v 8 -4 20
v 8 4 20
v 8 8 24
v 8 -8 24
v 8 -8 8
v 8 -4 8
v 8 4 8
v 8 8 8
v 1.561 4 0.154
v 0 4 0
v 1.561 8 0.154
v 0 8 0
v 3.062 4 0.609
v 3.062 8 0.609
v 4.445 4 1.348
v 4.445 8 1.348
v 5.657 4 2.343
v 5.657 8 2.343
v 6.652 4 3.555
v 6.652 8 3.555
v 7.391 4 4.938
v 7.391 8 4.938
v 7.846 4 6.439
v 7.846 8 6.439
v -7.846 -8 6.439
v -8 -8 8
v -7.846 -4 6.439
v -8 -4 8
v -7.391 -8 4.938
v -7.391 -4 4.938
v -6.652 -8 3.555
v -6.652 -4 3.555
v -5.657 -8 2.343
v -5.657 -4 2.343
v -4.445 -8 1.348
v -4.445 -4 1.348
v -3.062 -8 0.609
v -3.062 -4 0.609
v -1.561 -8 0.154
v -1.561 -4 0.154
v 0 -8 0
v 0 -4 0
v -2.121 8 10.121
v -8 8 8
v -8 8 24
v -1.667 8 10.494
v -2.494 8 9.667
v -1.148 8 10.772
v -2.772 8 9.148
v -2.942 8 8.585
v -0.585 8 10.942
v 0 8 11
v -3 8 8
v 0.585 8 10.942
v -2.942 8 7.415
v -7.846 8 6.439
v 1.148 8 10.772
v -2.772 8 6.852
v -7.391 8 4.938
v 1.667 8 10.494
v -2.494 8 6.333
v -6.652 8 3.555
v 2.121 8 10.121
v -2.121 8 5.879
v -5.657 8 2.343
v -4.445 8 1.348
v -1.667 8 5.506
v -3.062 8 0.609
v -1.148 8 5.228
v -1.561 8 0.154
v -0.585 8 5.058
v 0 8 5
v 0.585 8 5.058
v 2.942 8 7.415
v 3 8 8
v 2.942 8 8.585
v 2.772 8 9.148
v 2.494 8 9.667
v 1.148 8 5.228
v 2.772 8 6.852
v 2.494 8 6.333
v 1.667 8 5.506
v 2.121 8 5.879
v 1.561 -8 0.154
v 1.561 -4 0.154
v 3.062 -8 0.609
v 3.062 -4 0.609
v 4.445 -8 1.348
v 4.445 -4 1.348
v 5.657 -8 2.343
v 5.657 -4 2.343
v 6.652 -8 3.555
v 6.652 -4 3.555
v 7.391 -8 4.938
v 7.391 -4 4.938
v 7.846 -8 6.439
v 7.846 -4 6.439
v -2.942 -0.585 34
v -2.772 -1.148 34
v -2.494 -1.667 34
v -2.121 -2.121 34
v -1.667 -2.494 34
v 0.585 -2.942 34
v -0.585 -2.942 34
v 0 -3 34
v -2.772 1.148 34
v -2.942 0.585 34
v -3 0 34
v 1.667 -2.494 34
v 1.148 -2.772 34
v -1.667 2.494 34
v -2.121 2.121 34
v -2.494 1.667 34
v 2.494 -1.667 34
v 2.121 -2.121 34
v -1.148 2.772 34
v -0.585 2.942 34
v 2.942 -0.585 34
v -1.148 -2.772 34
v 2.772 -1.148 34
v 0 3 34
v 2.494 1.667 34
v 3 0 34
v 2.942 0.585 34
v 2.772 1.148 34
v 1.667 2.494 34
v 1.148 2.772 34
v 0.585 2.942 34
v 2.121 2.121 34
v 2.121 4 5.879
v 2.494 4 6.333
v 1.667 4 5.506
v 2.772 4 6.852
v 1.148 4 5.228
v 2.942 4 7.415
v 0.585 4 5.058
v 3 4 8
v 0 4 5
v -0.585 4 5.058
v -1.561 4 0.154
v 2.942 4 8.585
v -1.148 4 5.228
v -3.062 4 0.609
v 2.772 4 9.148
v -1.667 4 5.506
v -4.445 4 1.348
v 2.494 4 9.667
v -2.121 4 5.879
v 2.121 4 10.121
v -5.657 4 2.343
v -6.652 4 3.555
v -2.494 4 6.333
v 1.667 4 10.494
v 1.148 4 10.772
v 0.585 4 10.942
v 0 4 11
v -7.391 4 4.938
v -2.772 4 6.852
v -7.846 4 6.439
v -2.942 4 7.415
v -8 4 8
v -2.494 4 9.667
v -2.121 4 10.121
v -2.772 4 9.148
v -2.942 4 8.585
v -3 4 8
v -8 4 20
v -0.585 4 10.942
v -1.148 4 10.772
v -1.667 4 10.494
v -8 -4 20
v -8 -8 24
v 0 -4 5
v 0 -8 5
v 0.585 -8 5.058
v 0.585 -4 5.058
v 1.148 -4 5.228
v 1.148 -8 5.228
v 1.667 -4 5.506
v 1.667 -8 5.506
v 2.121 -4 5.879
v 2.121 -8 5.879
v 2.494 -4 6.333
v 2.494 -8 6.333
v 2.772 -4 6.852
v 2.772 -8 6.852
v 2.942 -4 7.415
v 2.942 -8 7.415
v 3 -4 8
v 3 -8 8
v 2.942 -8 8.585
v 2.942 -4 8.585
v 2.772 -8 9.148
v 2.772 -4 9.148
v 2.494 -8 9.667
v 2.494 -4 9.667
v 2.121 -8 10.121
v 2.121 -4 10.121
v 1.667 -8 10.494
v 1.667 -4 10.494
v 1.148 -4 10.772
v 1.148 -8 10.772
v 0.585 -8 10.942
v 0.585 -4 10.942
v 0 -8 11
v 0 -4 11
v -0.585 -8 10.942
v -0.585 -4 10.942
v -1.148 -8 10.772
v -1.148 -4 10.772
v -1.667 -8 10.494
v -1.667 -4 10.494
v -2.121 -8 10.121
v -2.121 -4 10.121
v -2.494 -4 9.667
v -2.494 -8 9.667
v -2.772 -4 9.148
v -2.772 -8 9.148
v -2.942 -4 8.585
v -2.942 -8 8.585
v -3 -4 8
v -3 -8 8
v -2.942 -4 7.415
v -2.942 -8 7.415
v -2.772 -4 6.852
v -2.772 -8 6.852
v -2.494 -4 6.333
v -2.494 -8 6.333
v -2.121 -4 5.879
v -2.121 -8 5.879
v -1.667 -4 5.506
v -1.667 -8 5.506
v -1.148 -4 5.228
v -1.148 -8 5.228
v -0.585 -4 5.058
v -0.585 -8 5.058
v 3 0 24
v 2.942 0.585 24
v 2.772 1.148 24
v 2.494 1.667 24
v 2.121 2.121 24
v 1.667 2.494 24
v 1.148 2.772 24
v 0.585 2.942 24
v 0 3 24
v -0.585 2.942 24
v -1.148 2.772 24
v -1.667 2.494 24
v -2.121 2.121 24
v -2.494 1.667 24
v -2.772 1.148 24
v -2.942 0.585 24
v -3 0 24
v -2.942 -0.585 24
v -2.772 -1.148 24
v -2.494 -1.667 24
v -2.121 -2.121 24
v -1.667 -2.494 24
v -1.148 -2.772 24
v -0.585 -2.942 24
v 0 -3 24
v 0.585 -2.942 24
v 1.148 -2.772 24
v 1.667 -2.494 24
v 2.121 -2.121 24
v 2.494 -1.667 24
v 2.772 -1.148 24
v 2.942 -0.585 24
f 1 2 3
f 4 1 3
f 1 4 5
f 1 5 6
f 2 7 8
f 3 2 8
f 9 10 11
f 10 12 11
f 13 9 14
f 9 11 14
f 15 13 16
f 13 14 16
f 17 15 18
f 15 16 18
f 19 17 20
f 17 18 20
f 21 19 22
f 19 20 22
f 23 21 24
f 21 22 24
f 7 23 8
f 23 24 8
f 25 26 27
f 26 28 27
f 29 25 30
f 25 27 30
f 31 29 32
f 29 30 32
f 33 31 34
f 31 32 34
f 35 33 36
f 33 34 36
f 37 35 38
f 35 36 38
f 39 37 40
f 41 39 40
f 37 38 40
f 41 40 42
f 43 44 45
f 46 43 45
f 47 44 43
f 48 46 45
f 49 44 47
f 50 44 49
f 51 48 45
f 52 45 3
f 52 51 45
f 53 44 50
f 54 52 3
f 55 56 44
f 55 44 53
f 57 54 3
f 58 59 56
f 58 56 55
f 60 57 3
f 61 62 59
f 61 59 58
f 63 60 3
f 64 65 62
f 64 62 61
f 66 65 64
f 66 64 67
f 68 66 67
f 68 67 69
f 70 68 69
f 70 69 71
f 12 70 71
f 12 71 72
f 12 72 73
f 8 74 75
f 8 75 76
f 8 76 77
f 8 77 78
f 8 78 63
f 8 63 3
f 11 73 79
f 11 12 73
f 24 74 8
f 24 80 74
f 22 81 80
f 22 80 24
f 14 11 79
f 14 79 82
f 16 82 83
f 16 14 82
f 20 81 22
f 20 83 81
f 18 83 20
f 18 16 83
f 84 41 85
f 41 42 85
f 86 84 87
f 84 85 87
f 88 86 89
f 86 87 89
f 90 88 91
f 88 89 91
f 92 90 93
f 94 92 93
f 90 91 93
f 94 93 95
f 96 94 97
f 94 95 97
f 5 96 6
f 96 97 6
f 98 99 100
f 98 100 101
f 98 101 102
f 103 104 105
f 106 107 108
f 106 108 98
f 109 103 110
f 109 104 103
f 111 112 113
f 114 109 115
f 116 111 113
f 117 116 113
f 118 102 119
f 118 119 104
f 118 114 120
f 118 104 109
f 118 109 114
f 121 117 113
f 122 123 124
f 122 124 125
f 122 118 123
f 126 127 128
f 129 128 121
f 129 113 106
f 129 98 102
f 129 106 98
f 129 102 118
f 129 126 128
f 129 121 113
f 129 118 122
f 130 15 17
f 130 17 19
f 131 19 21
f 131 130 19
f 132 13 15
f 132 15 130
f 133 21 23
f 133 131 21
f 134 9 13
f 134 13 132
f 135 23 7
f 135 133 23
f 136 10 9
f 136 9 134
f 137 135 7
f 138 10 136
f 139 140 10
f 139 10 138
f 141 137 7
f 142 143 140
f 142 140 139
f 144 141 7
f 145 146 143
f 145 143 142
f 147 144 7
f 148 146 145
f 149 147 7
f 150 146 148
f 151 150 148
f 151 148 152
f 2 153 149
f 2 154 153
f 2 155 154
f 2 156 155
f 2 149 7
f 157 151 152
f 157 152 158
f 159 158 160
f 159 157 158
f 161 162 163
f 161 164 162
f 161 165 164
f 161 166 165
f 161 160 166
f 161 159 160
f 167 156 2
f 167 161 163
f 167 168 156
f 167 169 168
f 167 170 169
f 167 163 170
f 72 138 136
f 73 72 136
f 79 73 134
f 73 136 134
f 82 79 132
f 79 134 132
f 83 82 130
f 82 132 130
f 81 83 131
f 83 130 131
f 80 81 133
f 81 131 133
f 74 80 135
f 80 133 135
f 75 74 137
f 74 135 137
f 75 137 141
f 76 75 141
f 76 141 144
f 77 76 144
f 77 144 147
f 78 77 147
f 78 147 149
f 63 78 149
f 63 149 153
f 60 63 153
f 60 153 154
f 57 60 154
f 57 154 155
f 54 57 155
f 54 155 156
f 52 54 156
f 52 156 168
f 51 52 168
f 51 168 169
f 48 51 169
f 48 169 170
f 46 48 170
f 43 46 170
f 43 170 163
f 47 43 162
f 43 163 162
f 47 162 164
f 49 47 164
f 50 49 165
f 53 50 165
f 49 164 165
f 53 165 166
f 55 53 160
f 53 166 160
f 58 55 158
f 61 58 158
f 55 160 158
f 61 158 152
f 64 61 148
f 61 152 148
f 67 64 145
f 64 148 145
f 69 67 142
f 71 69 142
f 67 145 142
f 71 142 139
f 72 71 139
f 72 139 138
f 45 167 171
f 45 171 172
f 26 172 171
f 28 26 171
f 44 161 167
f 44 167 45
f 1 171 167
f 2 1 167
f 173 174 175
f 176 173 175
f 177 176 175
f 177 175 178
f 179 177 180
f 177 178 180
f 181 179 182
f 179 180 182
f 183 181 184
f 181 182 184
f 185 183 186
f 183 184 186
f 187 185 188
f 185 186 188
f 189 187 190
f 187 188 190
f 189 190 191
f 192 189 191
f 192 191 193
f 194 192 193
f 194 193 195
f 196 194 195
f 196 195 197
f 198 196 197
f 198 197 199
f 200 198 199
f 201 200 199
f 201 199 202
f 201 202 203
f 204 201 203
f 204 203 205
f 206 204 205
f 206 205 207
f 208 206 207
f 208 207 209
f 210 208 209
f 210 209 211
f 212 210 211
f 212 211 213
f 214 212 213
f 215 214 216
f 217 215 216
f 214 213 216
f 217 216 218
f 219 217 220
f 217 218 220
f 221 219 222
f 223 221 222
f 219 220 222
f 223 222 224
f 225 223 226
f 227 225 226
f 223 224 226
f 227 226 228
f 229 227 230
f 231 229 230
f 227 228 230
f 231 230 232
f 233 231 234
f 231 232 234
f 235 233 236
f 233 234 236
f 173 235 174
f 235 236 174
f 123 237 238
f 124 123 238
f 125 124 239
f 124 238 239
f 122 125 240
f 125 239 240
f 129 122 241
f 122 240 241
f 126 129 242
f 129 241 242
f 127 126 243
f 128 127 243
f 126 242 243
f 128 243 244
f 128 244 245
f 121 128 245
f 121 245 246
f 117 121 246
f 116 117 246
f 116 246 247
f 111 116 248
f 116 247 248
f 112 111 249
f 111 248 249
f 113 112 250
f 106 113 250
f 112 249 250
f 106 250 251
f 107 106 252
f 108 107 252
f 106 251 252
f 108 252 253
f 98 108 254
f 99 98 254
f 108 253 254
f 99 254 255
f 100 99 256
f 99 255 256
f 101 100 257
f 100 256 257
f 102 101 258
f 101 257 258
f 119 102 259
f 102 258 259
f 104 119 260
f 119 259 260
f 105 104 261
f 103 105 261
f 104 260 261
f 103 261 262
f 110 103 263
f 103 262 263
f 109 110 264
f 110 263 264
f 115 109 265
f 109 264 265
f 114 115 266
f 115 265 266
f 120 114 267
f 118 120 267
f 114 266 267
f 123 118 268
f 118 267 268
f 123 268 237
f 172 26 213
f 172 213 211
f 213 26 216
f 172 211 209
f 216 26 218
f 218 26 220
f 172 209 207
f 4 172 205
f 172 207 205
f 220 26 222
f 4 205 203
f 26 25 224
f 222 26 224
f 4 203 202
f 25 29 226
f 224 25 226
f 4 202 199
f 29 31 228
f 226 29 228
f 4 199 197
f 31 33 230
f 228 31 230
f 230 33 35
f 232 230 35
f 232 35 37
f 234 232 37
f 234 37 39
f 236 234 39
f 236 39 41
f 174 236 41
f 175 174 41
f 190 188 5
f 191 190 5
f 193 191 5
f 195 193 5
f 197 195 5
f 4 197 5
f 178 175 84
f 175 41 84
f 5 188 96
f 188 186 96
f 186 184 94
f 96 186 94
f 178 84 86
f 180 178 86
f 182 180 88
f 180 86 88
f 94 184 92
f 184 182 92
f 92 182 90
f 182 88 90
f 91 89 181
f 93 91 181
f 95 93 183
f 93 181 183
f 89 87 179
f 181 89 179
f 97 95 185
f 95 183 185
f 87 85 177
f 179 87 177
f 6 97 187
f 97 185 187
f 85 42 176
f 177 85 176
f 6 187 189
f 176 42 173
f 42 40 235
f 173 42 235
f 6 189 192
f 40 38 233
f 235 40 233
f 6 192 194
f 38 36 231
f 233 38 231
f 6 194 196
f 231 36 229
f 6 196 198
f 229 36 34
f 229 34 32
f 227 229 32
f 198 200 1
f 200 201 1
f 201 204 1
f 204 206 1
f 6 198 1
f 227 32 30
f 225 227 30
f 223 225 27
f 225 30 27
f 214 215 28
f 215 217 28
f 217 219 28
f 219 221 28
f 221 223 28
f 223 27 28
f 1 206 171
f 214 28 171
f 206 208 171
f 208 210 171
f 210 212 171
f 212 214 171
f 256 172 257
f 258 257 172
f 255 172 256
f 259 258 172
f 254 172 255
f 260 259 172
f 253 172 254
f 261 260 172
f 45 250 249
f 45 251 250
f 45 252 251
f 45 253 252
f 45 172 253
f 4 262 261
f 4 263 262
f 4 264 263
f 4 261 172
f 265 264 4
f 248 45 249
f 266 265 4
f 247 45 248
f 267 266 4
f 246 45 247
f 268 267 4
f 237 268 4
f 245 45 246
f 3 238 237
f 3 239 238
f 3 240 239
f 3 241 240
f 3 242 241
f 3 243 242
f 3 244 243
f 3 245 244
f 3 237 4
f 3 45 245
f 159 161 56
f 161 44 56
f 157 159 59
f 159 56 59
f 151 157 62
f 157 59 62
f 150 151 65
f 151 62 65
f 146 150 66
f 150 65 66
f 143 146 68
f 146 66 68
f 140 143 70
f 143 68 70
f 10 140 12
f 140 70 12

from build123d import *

# Parameters (mm, degrees)
SKETCH1_W           = 16
SKETCH1_H           = 16
BOSS_EXTRUDE1_DEPTH = 24
SKETCH3_R           = 3
BOSS_EXTRUDE2_DEPTH = 10
SKETCH4_W           = 20
SKETCH4_H           = 8
CUT_EXTRUDE1_DEPTH  = 39.418745425
SKETCH5_R           = 3
CUT_EXTRUDE2_DEPTH  = 39.418745425
FILLET1_R           = 8


with BuildPart() as part:
    # Sketch1 → Boss-Extrude1 (new body)
    with BuildSketch(Plane.XY):
        Rectangle(SKETCH1_W, SKETCH1_H)
    extrude(amount=BOSS_EXTRUDE1_DEPTH)

    # Sketch3 → Boss-Extrude2 (add)
    with BuildSketch(Plane.XY.offset(24)):
        Circle(SKETCH3_R)
    extrude(amount=BOSS_EXTRUDE2_DEPTH)

    # Sketch4 → Cut-Extrude1 (cut, through all)
    with BuildSketch(Plane.ZY.offset(8)):
        with Locations((10, 0)):
            Rectangle(SKETCH4_W, SKETCH4_H)
    extrude(amount=-CUT_EXTRUDE1_DEPTH, mode=Mode.SUBTRACT)

    # Sketch5 → Cut-Extrude2 (cut, through all)
    with BuildSketch(Plane.XZ.offset(8)):
        with Locations(Location((0, 8, 0), (0, 0, 270))):
            Circle(SKETCH5_R)
    extrude(amount=-CUT_EXTRUDE2_DEPTH, mode=Mode.SUBTRACT)

    # Fillet1
    fillet1_edges = [part.edges().sort_by_distance(p)[0] for p in [
        (-8, 6, 0),
        (8, 6, 0),
        (8, -6, 0),
        (-8, -6, 0),
    ]]
    fillet(fillet1_edges, radius=FILLET1_R - 0.0001)  # a hair under: the kernel refuses the full size


solid = part.part
